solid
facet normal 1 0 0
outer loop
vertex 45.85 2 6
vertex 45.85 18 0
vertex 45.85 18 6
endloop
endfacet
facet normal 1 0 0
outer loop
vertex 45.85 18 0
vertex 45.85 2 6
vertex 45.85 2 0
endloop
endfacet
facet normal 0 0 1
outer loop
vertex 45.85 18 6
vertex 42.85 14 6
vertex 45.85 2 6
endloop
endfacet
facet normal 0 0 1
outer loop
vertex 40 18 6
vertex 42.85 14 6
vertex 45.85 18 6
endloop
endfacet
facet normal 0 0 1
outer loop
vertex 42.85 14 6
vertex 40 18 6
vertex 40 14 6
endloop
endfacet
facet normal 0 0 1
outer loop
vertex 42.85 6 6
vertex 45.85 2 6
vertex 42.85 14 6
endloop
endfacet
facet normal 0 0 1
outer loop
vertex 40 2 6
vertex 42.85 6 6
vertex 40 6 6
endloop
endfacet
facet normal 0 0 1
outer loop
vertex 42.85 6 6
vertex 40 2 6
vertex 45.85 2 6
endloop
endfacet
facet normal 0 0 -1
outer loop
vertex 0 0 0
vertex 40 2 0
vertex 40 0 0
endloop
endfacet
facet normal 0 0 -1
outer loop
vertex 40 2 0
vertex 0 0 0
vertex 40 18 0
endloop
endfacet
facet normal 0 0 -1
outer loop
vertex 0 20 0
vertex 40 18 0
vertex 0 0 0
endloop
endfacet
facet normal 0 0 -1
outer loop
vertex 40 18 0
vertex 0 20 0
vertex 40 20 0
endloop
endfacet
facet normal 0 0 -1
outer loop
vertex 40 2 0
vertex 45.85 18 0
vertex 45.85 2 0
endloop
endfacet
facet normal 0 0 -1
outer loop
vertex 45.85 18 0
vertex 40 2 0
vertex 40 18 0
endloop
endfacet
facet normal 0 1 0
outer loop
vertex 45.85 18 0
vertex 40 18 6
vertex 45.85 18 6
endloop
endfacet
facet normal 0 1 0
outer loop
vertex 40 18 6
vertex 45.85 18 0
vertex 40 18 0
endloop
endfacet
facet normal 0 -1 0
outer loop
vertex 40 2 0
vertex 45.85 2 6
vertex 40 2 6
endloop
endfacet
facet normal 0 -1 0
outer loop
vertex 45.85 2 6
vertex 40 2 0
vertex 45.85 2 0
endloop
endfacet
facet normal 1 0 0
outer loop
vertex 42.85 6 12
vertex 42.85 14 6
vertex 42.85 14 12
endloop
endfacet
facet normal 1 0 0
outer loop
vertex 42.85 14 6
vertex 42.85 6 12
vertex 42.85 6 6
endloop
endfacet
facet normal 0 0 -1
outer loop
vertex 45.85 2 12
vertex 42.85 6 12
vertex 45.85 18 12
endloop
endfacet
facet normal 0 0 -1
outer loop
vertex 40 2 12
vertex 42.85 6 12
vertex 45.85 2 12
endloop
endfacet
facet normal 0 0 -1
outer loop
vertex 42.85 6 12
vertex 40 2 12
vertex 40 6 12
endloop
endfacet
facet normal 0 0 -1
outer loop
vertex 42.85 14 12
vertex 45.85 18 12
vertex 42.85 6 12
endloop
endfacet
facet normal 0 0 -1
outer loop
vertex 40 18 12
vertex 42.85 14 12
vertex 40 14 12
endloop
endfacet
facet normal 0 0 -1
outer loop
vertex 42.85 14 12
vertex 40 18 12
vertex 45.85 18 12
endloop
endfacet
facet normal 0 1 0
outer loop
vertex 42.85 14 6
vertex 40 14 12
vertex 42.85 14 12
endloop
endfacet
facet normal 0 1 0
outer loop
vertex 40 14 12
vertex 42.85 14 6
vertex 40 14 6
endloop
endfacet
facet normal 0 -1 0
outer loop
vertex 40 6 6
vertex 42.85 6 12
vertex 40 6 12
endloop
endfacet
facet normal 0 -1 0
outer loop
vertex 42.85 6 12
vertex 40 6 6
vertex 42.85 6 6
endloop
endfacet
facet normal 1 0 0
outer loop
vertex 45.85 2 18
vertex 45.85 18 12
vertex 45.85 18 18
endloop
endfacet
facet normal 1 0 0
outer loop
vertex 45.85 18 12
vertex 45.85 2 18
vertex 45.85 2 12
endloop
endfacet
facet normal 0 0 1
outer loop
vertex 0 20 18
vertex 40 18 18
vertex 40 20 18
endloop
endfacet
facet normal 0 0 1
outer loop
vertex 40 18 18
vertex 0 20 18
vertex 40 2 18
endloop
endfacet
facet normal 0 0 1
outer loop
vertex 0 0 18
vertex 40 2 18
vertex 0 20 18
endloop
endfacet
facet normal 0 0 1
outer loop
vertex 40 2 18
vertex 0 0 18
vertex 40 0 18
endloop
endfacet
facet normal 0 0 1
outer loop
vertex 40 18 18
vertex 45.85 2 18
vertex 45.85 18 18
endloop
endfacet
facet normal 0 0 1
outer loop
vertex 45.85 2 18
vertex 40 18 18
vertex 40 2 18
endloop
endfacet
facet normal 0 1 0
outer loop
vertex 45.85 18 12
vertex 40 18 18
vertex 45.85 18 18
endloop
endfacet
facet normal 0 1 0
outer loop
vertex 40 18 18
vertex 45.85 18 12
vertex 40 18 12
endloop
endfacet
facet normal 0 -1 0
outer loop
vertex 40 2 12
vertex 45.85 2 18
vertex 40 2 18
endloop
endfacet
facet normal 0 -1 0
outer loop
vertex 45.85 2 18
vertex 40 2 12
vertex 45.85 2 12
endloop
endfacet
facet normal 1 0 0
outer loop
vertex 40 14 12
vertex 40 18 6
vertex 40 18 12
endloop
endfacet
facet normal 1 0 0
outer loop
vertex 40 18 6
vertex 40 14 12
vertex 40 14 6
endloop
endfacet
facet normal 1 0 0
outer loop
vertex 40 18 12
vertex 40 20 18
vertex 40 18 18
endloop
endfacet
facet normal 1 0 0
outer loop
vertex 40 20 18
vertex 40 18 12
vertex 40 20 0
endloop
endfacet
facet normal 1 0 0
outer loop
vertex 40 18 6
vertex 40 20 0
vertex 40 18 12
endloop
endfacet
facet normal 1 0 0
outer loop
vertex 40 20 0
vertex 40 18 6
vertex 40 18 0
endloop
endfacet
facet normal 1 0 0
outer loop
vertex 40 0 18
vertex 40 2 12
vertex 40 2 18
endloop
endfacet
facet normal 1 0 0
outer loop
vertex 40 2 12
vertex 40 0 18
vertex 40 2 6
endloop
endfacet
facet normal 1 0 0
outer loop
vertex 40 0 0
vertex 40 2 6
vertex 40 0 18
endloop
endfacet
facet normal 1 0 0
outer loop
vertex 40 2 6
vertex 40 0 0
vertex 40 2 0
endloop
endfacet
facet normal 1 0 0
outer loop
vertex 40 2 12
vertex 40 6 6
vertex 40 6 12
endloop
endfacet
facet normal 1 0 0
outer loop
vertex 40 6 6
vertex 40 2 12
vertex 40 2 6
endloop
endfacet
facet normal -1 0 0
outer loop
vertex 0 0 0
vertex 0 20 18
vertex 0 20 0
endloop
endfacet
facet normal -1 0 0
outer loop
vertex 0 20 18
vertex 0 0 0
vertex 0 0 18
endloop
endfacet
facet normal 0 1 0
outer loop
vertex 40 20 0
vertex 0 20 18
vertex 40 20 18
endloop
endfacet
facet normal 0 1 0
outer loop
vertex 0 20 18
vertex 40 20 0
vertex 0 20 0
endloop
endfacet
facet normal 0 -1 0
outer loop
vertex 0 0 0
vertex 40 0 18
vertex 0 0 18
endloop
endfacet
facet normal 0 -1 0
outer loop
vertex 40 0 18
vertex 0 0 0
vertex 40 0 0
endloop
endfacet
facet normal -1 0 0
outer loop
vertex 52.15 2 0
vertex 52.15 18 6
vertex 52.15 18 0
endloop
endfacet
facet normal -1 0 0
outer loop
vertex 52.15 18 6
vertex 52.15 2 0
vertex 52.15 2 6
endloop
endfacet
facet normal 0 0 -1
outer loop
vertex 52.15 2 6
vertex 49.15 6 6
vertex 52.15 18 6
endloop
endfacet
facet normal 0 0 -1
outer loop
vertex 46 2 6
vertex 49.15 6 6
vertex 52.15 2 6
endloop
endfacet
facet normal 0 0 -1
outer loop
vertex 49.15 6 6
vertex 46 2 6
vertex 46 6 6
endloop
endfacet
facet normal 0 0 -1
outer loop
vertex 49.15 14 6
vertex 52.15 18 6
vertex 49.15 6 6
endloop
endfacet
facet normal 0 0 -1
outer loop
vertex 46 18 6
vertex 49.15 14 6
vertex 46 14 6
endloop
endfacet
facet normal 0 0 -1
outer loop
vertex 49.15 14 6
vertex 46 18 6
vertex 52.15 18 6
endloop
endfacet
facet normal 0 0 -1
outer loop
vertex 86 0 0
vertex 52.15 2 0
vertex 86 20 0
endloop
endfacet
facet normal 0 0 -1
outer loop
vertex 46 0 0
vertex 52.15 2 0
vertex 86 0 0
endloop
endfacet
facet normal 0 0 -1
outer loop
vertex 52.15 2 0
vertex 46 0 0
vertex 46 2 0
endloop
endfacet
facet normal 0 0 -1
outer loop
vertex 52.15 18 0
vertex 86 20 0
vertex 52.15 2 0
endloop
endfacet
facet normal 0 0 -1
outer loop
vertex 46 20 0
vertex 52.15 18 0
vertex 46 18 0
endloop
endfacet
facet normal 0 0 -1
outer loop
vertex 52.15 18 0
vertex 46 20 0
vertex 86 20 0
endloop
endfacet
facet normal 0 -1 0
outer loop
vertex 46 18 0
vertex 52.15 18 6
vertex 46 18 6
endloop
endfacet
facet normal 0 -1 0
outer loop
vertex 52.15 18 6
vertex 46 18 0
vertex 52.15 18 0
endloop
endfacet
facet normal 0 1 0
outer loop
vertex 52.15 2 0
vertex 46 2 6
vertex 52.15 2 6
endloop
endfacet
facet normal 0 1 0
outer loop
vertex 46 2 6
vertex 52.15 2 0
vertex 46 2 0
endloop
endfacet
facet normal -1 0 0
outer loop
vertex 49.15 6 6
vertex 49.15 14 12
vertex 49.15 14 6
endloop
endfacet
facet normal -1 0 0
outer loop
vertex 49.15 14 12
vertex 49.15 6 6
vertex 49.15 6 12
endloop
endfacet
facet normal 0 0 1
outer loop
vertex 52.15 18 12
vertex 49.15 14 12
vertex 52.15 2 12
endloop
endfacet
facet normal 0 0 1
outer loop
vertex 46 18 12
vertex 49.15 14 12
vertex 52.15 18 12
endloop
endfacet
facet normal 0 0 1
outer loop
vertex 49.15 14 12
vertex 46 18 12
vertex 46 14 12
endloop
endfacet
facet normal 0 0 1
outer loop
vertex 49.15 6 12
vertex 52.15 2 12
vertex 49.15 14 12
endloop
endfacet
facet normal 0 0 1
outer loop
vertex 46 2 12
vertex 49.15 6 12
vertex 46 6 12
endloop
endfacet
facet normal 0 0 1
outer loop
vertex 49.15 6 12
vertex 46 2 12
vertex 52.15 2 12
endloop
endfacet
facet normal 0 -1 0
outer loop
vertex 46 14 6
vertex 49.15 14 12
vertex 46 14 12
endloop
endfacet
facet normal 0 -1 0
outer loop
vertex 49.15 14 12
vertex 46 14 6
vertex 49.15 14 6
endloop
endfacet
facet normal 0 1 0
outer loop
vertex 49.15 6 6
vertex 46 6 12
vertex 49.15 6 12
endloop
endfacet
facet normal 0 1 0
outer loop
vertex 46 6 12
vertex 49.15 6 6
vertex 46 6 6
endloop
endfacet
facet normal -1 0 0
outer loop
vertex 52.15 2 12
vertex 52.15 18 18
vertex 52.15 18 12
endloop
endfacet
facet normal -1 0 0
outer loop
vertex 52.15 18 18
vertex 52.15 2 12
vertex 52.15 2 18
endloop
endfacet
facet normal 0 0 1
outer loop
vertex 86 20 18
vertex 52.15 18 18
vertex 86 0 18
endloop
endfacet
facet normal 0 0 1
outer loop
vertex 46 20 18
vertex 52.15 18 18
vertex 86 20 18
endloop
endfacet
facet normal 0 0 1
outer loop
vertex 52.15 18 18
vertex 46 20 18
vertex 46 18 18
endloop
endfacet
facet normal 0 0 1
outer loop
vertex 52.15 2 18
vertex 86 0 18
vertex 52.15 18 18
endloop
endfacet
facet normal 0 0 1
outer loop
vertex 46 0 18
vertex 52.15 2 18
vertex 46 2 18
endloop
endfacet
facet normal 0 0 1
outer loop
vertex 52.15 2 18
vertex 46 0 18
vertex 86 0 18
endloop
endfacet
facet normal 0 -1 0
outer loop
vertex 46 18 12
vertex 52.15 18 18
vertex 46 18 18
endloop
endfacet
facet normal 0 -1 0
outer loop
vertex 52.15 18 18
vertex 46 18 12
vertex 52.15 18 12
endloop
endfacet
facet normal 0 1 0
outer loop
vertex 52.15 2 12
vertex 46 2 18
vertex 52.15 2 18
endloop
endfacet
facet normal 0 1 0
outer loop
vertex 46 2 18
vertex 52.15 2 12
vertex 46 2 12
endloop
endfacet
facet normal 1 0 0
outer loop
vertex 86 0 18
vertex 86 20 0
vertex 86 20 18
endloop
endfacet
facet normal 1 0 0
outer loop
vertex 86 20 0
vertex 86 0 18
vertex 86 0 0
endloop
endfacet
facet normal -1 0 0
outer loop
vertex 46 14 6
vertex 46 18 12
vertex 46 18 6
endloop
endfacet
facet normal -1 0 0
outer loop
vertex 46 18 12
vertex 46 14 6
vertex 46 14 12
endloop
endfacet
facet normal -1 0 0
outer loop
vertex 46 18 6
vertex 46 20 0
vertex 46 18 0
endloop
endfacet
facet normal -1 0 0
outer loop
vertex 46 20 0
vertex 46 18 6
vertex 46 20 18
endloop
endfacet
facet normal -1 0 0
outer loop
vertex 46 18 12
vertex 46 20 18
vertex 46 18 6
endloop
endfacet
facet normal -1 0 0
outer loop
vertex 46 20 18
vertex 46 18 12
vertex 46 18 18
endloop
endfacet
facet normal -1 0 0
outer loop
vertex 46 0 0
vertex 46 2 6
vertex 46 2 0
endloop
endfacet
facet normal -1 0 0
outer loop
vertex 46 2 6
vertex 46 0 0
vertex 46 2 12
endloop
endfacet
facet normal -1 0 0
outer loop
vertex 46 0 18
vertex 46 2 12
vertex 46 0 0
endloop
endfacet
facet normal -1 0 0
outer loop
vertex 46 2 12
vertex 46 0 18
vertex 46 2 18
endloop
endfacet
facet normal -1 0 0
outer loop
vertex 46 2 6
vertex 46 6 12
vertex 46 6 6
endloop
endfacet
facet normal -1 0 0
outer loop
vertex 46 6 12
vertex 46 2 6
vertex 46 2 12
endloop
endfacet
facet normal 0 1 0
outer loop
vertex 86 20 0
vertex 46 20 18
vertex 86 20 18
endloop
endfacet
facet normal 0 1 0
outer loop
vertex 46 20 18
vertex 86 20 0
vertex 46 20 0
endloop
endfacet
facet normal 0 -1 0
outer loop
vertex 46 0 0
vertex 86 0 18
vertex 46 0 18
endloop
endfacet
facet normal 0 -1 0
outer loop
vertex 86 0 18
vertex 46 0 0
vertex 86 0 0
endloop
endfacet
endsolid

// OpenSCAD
/*
  Simple dovetail seam generator for rectangular parts.

  Idea:
  - The seam profile along X is built from 3 stacked blocks:
      positive, negative, positive
  - Call with:
      positive   = true  -> male side
      positive   = false -> female side
      right_side = true  -> seam placed on +X side
      right_side = false -> seam placed on -X side
  - gap adds clearance between the two mating parts, centered on the seam.

  Usage pattern:
    difference() {
      cube([W,D,H]);
      dovetail_cut([W,D,H], positive=false, right_side=true, ...);
    }

    union() {
      cube([W,D,H]);
      dovetail_cut([W,D,H], positive=true, right_side=false, ...);
    }

  Coordinate convention:
  - Main part is assumed to be cube([W,D,H]) at the origin.
  - Dovetail runs through full Z.
  - Joint shape varies along X, centered in Y.
*/

module dovetail_cut(
    size = [100, 20, 10],   // [W, D, H] of the base block
    positive = true,        // male or female
    right_side = true,      // seam on +X or -X side
    neck = 6,               // middle (negative) width along X
    shoulder = 10,          // top/bottom (positive) width along X
    mid_depth = 8,          // Y size of middle cube
    outer_depth = 14,       // Y size of top/bottom cubes
    gap = 0                 // clearance centered on seam
) {
    W = size[0];
    D = size[1];
    H = size[2];

    // Clamp to sane values
    _neck       = max(0.01, neck);
    _shoulder   = max(_neck, shoulder);
    _mid_depth  = min(D, max(0.01, mid_depth));
    _outer_depth= min(D, max(_mid_depth, outer_depth));
    _gap        = max(0, gap);

    y_mid   = (D - _mid_depth) / 2;
    y_outer = (D - _outer_depth) / 2;

    // Seam is centered on the side face, with optional gap opening
    // Male shrinks by gap/2, female grows by gap/2.
    male_neck     = max(0.01, _neck     - _gap);
    male_shoulder = max(male_neck, _shoulder - _gap);

    female_neck     = _neck     + _gap;
    female_shoulder = _shoulder + _gap;

    use_neck     = positive ? male_neck     : female_neck;
    use_shoulder = positive ? male_shoulder : female_shoulder;

    // X placement:
    // right side  -> joint centered at x = W
    // left side   -> joint centered at x = 0
    seam_x = right_side ? W : 0;

    module stack_shape(nx, sx) {
        union() {
            // bottom positive
            translate([-sx/2, y_outer, 0])
                cube([sx, _outer_depth, H/3]);

            // middle negative
            translate([-nx/2, y_mid, H/3])
                cube([nx, _mid_depth, H/3]);

            // top positive
            translate([-sx/2, y_outer, 2*H/3])
                cube([sx, _outer_depth, H/3]);
        }
    }

    translate([seam_x, 0, 0])
        stack_shape(use_neck, use_shoulder);
}

$fn = 32;

W = 40;
D = 20;
H = 18;
SEP = 6;

module left_part() {
    union() {
        cube([W, D, H]);
        dovetail_cut(
            size=[W,D,H],
            positive=true,
            right_side=true,
            neck=6,
            shoulder=12,
            mid_depth=8,
            outer_depth=16,
            gap=0.3
        );
    }
}

module right_part() {
    difference() {
        cube([W, D, H]);
        dovetail_cut(
            size=[W,D,H],
            positive=false,
            right_side=false,
            neck=6,
            shoulder=12,
            mid_depth=8,
            outer_depth=16,
            gap=0.3
        );
    }
}

translate([0,0,0]) left_part();
translate([W + SEP, 0, 0]) right_part();
